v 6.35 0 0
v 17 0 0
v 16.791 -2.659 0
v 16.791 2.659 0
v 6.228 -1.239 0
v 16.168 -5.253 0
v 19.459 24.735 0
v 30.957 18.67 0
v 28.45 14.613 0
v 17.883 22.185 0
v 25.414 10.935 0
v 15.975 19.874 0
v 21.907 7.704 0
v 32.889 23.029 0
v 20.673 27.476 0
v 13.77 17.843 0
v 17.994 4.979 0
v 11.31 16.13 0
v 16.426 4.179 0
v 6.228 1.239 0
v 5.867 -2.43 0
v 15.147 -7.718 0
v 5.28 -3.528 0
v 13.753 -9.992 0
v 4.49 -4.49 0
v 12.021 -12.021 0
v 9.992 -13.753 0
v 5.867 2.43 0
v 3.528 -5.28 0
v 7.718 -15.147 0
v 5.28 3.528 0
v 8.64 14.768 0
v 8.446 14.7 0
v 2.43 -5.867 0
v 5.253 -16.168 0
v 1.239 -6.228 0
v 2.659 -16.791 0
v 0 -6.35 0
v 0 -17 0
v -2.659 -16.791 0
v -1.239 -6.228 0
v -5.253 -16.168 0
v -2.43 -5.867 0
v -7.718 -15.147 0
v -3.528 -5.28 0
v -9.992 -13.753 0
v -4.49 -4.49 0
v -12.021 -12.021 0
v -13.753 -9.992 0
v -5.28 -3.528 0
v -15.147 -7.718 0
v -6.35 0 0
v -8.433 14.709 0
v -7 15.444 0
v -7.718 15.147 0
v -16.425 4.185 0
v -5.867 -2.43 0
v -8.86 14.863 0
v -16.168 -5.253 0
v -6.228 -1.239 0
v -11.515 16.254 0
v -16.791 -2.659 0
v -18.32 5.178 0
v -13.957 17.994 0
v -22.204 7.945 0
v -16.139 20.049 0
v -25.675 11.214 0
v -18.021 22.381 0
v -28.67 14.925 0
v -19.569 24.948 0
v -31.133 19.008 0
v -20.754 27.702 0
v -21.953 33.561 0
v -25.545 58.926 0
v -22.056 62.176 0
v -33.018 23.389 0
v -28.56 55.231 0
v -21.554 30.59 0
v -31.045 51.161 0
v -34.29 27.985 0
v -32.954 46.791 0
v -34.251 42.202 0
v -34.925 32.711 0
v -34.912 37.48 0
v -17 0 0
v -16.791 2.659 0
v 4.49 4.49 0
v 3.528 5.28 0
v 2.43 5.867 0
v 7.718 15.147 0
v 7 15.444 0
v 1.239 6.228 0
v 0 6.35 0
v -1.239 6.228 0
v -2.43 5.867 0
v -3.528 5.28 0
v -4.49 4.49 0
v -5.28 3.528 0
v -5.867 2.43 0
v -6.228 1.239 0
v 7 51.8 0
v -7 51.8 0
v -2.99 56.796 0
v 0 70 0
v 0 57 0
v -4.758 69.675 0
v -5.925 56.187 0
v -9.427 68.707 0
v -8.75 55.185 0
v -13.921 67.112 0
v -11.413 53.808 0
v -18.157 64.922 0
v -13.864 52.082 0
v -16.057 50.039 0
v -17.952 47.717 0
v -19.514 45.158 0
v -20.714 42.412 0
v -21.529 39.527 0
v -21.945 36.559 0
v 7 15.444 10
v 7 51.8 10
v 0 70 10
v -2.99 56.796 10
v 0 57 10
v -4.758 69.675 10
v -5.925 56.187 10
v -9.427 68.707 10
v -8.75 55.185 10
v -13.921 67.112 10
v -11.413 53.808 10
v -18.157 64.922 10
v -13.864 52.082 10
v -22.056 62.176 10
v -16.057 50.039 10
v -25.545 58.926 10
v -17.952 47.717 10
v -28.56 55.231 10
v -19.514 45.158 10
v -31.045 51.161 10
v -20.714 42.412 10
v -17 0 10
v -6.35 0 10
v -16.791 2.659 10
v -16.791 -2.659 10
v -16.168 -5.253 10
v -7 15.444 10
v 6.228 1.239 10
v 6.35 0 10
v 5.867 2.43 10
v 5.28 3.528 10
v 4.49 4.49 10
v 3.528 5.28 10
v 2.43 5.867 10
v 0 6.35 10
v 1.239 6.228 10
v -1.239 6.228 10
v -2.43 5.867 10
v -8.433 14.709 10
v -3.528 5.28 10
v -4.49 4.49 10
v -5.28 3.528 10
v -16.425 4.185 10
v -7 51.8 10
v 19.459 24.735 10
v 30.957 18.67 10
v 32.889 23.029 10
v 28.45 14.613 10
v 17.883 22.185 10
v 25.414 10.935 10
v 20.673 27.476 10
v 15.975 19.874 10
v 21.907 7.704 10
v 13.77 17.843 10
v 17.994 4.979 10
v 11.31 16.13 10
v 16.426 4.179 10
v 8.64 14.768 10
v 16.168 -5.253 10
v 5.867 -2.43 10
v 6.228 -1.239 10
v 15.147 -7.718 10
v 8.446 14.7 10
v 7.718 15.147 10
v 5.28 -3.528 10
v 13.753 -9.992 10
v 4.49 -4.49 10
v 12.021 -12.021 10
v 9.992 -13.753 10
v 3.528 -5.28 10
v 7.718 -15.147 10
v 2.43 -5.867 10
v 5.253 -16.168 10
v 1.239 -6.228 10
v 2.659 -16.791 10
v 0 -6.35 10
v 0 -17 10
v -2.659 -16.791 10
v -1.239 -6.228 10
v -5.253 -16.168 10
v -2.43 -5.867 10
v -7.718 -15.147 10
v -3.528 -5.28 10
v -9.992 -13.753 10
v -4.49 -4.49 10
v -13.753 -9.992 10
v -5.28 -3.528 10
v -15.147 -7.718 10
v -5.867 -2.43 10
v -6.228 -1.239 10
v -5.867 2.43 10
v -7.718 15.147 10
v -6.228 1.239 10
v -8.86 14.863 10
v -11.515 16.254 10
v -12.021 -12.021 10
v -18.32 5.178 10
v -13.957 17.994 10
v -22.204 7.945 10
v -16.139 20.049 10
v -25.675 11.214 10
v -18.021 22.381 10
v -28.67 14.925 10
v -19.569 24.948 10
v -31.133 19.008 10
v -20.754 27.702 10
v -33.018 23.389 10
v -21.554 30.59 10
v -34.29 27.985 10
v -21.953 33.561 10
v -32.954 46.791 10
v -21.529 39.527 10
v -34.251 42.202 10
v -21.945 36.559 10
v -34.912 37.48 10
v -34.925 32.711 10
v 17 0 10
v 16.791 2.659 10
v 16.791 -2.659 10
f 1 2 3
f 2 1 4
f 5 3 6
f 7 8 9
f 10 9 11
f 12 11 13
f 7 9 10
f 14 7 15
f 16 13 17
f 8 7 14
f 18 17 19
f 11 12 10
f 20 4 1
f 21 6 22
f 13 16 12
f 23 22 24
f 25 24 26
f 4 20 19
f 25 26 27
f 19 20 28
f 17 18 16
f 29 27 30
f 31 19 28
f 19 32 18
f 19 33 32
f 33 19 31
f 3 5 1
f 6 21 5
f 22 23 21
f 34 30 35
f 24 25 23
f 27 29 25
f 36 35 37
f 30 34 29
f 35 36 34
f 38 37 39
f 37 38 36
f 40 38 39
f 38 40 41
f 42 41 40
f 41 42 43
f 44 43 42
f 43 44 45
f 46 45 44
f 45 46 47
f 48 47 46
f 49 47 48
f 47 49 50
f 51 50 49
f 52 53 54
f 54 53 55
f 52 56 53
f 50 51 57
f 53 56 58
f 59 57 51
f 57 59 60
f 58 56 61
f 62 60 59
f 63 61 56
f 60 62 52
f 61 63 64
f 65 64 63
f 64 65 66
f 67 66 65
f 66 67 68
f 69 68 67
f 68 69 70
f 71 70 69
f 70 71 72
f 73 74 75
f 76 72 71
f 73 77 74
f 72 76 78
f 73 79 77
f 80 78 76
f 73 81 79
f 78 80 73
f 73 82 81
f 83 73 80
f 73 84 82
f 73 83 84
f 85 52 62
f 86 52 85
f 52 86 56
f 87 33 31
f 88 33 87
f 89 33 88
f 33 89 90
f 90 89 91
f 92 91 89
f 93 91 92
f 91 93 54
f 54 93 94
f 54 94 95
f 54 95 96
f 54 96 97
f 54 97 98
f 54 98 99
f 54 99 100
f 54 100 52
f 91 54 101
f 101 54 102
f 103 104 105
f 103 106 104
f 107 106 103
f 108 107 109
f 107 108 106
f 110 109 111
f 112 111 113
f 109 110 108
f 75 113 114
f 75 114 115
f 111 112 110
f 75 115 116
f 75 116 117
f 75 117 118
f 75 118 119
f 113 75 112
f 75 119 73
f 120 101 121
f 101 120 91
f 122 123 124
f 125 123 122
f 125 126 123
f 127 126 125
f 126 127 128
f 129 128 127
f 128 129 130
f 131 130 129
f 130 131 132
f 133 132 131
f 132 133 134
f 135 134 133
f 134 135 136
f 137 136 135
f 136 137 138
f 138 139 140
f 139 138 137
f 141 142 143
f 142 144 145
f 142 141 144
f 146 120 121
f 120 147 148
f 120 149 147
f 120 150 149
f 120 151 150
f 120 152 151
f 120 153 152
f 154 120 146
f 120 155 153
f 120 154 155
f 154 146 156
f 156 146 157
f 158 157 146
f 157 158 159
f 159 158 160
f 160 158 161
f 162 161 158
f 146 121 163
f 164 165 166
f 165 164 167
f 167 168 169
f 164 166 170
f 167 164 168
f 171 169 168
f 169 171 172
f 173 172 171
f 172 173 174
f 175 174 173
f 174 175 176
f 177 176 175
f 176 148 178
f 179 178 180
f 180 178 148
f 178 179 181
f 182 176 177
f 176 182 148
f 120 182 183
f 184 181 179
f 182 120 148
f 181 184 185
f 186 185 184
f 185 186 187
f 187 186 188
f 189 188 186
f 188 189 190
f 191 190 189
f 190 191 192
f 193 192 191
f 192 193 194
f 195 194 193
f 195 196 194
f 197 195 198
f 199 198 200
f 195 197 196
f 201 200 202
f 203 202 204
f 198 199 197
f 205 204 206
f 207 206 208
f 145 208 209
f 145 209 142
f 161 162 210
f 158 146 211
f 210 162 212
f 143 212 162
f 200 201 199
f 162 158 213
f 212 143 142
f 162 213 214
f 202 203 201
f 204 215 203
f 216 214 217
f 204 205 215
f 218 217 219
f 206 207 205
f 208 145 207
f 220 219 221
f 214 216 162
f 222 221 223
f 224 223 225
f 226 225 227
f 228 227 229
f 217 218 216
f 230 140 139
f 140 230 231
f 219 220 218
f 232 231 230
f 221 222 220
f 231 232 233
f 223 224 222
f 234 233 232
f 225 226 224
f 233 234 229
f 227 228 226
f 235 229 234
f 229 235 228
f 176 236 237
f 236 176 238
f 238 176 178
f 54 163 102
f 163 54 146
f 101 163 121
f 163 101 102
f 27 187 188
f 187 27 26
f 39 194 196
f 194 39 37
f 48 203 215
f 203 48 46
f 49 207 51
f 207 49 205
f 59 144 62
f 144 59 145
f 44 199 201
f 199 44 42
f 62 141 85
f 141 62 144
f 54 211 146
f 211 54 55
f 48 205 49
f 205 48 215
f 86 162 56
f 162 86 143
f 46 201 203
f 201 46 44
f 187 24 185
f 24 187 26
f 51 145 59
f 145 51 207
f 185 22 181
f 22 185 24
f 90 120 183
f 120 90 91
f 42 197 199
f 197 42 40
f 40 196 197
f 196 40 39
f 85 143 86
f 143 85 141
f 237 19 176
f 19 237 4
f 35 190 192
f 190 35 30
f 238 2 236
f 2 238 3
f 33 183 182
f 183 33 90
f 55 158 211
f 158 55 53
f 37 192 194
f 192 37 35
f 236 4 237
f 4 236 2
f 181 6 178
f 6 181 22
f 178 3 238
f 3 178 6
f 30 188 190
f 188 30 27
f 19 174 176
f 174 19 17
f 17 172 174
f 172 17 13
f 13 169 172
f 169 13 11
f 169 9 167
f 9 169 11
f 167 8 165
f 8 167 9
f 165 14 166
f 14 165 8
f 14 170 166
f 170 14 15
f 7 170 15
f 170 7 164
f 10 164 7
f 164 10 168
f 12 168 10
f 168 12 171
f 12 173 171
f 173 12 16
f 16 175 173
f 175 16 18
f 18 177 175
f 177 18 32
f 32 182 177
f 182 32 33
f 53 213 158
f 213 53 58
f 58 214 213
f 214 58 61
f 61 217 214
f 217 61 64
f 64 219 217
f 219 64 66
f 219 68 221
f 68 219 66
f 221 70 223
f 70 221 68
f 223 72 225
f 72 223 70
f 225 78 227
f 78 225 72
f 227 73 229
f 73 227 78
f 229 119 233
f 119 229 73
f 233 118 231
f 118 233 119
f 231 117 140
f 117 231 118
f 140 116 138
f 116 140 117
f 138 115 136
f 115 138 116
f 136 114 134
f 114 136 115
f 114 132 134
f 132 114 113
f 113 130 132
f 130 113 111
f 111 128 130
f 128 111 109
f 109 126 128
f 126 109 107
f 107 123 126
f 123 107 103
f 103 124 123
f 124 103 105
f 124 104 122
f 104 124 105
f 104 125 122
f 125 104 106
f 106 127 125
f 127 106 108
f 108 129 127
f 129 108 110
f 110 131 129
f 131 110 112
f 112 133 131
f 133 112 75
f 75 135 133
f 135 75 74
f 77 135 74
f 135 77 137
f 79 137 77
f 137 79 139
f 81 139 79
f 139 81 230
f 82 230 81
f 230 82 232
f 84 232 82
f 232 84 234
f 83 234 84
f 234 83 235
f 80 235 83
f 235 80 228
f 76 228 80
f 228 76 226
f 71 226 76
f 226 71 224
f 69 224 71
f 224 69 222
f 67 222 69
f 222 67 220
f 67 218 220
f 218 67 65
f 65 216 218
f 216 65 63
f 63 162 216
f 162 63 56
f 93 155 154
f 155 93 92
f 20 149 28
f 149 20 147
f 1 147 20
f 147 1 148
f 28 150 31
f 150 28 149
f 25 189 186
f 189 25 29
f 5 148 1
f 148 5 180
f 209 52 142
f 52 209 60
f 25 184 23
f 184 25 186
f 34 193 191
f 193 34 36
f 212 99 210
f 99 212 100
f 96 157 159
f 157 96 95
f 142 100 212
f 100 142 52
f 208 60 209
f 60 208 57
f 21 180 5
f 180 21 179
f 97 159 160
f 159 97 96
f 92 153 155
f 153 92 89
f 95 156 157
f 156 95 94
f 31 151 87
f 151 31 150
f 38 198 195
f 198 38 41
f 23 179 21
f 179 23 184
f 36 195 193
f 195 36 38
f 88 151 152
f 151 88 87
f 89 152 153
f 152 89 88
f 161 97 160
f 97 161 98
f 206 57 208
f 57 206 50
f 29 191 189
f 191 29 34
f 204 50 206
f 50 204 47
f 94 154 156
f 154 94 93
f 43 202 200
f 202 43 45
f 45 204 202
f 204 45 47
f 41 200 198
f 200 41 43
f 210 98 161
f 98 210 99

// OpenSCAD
$fn = 32;

// ----------------------------------------------------------------------
// Hook: 70 mm shank into a 22 mm curl, 10 mm thick
// ----------------------------------------------------------------------

// --- parameters (mm) ---
shank_len = 70;           // shank length from the boss centre
shank_w = 14;             // shank width
boss_d = 34;              // boss diameter
bore_d = 12.7;            // boss bore
curl_in = 22;             // curl inner radius
curl_out = 35;            // curl outer radius
curl_sweep = 250;         // curl sweep angle
hook_t = 10;              // hook thickness

shank_profile = [[-7, 51.8], [7, 51.8], [7, 15], [-7, 15]];
boss_profile = [[17, 0], [16.791, 2.659], [16.168, 5.253], [15.147, 7.718], [13.753, 9.992], [12.021, 12.021], [9.992, 13.753], [7.718, 15.147], [5.253, 16.168], [2.659, 16.791], [0, 17], [-2.659, 16.791], [-5.253, 16.168], [-7.718, 15.147], [-9.992, 13.753], [-12.021, 12.021], [-13.753, 9.992], [-15.147, 7.718], [-16.168, 5.253], [-16.791, 2.659], [-17, 0], [-16.791, -2.659], [-16.168, -5.253], [-15.147, -7.718], [-13.753, -9.992], [-12.021, -12.021], [-9.992, -13.753], [-7.718, -15.147], [-5.253, -16.168], [-2.659, -16.791], [0, -17], [2.659, -16.791], [5.253, -16.168], [7.718, -15.147], [9.992, -13.753], [12.021, -12.021], [13.753, -9.992], [15.147, -7.718], [16.168, -5.253], [16.791, -2.659]];
curl_profile = [[0, 70], [-4.758, 69.675], [-9.427, 68.707], [-13.921, 67.112], [-18.157, 64.922], [-22.056, 62.176], [-25.545, 58.926], [-28.56, 55.231], [-31.045, 51.161], [-32.954, 46.791], [-34.251, 42.202], [-34.912, 37.48], [-34.925, 32.711], [-34.29, 27.985], [-33.018, 23.389], [-31.133, 19.008], [-28.67, 14.925], [-25.675, 11.214], [-22.204, 7.945], [-18.32, 5.178], [-14.096, 2.964], [-9.611, 1.345], [-4.947, 0.351], [-0.191, 0.001], [4.568, 0.299], [9.243, 1.243], [13.746, 2.812], [17.994, 4.979], [21.907, 7.704], [25.414, 10.935], [28.45, 14.613], [30.957, 18.67], [32.889, 23.029], [20.673, 27.476], [19.459, 24.735], [17.883, 22.185], [15.975, 19.874], [13.77, 17.843], [11.31, 16.13], [8.64, 14.768], [5.81, 13.781], [2.872, 13.188], [-0.12, 13], [-3.109, 13.221], [-6.041, 13.846], [-8.86, 14.863], [-11.515, 16.254], [-13.957, 17.994], [-16.139, 20.049], [-18.021, 22.381], [-19.569, 24.948], [-20.754, 27.702], [-21.554, 30.59], [-21.953, 33.561], [-21.945, 36.559], [-21.529, 39.527], [-20.714, 42.412], [-19.514, 45.158], [-17.952, 47.717], [-16.057, 50.039], [-13.864, 52.082], [-11.413, 53.808], [-8.75, 55.185], [-5.925, 56.187], [-2.99, 56.796], [0, 57]];

difference() {
  union() {
    /* three overlapping outlines: shank, boss and the smooth curl */
    linear_extrude(height = hook_t) polygon(shank_profile);
    linear_extrude(height = hook_t) polygon(boss_profile);
    linear_extrude(height = hook_t) polygon(curl_profile);
  }
  translate([0, 0, -2.5]) cylinder(h = hook_t + 5, d = bore_d);
}
